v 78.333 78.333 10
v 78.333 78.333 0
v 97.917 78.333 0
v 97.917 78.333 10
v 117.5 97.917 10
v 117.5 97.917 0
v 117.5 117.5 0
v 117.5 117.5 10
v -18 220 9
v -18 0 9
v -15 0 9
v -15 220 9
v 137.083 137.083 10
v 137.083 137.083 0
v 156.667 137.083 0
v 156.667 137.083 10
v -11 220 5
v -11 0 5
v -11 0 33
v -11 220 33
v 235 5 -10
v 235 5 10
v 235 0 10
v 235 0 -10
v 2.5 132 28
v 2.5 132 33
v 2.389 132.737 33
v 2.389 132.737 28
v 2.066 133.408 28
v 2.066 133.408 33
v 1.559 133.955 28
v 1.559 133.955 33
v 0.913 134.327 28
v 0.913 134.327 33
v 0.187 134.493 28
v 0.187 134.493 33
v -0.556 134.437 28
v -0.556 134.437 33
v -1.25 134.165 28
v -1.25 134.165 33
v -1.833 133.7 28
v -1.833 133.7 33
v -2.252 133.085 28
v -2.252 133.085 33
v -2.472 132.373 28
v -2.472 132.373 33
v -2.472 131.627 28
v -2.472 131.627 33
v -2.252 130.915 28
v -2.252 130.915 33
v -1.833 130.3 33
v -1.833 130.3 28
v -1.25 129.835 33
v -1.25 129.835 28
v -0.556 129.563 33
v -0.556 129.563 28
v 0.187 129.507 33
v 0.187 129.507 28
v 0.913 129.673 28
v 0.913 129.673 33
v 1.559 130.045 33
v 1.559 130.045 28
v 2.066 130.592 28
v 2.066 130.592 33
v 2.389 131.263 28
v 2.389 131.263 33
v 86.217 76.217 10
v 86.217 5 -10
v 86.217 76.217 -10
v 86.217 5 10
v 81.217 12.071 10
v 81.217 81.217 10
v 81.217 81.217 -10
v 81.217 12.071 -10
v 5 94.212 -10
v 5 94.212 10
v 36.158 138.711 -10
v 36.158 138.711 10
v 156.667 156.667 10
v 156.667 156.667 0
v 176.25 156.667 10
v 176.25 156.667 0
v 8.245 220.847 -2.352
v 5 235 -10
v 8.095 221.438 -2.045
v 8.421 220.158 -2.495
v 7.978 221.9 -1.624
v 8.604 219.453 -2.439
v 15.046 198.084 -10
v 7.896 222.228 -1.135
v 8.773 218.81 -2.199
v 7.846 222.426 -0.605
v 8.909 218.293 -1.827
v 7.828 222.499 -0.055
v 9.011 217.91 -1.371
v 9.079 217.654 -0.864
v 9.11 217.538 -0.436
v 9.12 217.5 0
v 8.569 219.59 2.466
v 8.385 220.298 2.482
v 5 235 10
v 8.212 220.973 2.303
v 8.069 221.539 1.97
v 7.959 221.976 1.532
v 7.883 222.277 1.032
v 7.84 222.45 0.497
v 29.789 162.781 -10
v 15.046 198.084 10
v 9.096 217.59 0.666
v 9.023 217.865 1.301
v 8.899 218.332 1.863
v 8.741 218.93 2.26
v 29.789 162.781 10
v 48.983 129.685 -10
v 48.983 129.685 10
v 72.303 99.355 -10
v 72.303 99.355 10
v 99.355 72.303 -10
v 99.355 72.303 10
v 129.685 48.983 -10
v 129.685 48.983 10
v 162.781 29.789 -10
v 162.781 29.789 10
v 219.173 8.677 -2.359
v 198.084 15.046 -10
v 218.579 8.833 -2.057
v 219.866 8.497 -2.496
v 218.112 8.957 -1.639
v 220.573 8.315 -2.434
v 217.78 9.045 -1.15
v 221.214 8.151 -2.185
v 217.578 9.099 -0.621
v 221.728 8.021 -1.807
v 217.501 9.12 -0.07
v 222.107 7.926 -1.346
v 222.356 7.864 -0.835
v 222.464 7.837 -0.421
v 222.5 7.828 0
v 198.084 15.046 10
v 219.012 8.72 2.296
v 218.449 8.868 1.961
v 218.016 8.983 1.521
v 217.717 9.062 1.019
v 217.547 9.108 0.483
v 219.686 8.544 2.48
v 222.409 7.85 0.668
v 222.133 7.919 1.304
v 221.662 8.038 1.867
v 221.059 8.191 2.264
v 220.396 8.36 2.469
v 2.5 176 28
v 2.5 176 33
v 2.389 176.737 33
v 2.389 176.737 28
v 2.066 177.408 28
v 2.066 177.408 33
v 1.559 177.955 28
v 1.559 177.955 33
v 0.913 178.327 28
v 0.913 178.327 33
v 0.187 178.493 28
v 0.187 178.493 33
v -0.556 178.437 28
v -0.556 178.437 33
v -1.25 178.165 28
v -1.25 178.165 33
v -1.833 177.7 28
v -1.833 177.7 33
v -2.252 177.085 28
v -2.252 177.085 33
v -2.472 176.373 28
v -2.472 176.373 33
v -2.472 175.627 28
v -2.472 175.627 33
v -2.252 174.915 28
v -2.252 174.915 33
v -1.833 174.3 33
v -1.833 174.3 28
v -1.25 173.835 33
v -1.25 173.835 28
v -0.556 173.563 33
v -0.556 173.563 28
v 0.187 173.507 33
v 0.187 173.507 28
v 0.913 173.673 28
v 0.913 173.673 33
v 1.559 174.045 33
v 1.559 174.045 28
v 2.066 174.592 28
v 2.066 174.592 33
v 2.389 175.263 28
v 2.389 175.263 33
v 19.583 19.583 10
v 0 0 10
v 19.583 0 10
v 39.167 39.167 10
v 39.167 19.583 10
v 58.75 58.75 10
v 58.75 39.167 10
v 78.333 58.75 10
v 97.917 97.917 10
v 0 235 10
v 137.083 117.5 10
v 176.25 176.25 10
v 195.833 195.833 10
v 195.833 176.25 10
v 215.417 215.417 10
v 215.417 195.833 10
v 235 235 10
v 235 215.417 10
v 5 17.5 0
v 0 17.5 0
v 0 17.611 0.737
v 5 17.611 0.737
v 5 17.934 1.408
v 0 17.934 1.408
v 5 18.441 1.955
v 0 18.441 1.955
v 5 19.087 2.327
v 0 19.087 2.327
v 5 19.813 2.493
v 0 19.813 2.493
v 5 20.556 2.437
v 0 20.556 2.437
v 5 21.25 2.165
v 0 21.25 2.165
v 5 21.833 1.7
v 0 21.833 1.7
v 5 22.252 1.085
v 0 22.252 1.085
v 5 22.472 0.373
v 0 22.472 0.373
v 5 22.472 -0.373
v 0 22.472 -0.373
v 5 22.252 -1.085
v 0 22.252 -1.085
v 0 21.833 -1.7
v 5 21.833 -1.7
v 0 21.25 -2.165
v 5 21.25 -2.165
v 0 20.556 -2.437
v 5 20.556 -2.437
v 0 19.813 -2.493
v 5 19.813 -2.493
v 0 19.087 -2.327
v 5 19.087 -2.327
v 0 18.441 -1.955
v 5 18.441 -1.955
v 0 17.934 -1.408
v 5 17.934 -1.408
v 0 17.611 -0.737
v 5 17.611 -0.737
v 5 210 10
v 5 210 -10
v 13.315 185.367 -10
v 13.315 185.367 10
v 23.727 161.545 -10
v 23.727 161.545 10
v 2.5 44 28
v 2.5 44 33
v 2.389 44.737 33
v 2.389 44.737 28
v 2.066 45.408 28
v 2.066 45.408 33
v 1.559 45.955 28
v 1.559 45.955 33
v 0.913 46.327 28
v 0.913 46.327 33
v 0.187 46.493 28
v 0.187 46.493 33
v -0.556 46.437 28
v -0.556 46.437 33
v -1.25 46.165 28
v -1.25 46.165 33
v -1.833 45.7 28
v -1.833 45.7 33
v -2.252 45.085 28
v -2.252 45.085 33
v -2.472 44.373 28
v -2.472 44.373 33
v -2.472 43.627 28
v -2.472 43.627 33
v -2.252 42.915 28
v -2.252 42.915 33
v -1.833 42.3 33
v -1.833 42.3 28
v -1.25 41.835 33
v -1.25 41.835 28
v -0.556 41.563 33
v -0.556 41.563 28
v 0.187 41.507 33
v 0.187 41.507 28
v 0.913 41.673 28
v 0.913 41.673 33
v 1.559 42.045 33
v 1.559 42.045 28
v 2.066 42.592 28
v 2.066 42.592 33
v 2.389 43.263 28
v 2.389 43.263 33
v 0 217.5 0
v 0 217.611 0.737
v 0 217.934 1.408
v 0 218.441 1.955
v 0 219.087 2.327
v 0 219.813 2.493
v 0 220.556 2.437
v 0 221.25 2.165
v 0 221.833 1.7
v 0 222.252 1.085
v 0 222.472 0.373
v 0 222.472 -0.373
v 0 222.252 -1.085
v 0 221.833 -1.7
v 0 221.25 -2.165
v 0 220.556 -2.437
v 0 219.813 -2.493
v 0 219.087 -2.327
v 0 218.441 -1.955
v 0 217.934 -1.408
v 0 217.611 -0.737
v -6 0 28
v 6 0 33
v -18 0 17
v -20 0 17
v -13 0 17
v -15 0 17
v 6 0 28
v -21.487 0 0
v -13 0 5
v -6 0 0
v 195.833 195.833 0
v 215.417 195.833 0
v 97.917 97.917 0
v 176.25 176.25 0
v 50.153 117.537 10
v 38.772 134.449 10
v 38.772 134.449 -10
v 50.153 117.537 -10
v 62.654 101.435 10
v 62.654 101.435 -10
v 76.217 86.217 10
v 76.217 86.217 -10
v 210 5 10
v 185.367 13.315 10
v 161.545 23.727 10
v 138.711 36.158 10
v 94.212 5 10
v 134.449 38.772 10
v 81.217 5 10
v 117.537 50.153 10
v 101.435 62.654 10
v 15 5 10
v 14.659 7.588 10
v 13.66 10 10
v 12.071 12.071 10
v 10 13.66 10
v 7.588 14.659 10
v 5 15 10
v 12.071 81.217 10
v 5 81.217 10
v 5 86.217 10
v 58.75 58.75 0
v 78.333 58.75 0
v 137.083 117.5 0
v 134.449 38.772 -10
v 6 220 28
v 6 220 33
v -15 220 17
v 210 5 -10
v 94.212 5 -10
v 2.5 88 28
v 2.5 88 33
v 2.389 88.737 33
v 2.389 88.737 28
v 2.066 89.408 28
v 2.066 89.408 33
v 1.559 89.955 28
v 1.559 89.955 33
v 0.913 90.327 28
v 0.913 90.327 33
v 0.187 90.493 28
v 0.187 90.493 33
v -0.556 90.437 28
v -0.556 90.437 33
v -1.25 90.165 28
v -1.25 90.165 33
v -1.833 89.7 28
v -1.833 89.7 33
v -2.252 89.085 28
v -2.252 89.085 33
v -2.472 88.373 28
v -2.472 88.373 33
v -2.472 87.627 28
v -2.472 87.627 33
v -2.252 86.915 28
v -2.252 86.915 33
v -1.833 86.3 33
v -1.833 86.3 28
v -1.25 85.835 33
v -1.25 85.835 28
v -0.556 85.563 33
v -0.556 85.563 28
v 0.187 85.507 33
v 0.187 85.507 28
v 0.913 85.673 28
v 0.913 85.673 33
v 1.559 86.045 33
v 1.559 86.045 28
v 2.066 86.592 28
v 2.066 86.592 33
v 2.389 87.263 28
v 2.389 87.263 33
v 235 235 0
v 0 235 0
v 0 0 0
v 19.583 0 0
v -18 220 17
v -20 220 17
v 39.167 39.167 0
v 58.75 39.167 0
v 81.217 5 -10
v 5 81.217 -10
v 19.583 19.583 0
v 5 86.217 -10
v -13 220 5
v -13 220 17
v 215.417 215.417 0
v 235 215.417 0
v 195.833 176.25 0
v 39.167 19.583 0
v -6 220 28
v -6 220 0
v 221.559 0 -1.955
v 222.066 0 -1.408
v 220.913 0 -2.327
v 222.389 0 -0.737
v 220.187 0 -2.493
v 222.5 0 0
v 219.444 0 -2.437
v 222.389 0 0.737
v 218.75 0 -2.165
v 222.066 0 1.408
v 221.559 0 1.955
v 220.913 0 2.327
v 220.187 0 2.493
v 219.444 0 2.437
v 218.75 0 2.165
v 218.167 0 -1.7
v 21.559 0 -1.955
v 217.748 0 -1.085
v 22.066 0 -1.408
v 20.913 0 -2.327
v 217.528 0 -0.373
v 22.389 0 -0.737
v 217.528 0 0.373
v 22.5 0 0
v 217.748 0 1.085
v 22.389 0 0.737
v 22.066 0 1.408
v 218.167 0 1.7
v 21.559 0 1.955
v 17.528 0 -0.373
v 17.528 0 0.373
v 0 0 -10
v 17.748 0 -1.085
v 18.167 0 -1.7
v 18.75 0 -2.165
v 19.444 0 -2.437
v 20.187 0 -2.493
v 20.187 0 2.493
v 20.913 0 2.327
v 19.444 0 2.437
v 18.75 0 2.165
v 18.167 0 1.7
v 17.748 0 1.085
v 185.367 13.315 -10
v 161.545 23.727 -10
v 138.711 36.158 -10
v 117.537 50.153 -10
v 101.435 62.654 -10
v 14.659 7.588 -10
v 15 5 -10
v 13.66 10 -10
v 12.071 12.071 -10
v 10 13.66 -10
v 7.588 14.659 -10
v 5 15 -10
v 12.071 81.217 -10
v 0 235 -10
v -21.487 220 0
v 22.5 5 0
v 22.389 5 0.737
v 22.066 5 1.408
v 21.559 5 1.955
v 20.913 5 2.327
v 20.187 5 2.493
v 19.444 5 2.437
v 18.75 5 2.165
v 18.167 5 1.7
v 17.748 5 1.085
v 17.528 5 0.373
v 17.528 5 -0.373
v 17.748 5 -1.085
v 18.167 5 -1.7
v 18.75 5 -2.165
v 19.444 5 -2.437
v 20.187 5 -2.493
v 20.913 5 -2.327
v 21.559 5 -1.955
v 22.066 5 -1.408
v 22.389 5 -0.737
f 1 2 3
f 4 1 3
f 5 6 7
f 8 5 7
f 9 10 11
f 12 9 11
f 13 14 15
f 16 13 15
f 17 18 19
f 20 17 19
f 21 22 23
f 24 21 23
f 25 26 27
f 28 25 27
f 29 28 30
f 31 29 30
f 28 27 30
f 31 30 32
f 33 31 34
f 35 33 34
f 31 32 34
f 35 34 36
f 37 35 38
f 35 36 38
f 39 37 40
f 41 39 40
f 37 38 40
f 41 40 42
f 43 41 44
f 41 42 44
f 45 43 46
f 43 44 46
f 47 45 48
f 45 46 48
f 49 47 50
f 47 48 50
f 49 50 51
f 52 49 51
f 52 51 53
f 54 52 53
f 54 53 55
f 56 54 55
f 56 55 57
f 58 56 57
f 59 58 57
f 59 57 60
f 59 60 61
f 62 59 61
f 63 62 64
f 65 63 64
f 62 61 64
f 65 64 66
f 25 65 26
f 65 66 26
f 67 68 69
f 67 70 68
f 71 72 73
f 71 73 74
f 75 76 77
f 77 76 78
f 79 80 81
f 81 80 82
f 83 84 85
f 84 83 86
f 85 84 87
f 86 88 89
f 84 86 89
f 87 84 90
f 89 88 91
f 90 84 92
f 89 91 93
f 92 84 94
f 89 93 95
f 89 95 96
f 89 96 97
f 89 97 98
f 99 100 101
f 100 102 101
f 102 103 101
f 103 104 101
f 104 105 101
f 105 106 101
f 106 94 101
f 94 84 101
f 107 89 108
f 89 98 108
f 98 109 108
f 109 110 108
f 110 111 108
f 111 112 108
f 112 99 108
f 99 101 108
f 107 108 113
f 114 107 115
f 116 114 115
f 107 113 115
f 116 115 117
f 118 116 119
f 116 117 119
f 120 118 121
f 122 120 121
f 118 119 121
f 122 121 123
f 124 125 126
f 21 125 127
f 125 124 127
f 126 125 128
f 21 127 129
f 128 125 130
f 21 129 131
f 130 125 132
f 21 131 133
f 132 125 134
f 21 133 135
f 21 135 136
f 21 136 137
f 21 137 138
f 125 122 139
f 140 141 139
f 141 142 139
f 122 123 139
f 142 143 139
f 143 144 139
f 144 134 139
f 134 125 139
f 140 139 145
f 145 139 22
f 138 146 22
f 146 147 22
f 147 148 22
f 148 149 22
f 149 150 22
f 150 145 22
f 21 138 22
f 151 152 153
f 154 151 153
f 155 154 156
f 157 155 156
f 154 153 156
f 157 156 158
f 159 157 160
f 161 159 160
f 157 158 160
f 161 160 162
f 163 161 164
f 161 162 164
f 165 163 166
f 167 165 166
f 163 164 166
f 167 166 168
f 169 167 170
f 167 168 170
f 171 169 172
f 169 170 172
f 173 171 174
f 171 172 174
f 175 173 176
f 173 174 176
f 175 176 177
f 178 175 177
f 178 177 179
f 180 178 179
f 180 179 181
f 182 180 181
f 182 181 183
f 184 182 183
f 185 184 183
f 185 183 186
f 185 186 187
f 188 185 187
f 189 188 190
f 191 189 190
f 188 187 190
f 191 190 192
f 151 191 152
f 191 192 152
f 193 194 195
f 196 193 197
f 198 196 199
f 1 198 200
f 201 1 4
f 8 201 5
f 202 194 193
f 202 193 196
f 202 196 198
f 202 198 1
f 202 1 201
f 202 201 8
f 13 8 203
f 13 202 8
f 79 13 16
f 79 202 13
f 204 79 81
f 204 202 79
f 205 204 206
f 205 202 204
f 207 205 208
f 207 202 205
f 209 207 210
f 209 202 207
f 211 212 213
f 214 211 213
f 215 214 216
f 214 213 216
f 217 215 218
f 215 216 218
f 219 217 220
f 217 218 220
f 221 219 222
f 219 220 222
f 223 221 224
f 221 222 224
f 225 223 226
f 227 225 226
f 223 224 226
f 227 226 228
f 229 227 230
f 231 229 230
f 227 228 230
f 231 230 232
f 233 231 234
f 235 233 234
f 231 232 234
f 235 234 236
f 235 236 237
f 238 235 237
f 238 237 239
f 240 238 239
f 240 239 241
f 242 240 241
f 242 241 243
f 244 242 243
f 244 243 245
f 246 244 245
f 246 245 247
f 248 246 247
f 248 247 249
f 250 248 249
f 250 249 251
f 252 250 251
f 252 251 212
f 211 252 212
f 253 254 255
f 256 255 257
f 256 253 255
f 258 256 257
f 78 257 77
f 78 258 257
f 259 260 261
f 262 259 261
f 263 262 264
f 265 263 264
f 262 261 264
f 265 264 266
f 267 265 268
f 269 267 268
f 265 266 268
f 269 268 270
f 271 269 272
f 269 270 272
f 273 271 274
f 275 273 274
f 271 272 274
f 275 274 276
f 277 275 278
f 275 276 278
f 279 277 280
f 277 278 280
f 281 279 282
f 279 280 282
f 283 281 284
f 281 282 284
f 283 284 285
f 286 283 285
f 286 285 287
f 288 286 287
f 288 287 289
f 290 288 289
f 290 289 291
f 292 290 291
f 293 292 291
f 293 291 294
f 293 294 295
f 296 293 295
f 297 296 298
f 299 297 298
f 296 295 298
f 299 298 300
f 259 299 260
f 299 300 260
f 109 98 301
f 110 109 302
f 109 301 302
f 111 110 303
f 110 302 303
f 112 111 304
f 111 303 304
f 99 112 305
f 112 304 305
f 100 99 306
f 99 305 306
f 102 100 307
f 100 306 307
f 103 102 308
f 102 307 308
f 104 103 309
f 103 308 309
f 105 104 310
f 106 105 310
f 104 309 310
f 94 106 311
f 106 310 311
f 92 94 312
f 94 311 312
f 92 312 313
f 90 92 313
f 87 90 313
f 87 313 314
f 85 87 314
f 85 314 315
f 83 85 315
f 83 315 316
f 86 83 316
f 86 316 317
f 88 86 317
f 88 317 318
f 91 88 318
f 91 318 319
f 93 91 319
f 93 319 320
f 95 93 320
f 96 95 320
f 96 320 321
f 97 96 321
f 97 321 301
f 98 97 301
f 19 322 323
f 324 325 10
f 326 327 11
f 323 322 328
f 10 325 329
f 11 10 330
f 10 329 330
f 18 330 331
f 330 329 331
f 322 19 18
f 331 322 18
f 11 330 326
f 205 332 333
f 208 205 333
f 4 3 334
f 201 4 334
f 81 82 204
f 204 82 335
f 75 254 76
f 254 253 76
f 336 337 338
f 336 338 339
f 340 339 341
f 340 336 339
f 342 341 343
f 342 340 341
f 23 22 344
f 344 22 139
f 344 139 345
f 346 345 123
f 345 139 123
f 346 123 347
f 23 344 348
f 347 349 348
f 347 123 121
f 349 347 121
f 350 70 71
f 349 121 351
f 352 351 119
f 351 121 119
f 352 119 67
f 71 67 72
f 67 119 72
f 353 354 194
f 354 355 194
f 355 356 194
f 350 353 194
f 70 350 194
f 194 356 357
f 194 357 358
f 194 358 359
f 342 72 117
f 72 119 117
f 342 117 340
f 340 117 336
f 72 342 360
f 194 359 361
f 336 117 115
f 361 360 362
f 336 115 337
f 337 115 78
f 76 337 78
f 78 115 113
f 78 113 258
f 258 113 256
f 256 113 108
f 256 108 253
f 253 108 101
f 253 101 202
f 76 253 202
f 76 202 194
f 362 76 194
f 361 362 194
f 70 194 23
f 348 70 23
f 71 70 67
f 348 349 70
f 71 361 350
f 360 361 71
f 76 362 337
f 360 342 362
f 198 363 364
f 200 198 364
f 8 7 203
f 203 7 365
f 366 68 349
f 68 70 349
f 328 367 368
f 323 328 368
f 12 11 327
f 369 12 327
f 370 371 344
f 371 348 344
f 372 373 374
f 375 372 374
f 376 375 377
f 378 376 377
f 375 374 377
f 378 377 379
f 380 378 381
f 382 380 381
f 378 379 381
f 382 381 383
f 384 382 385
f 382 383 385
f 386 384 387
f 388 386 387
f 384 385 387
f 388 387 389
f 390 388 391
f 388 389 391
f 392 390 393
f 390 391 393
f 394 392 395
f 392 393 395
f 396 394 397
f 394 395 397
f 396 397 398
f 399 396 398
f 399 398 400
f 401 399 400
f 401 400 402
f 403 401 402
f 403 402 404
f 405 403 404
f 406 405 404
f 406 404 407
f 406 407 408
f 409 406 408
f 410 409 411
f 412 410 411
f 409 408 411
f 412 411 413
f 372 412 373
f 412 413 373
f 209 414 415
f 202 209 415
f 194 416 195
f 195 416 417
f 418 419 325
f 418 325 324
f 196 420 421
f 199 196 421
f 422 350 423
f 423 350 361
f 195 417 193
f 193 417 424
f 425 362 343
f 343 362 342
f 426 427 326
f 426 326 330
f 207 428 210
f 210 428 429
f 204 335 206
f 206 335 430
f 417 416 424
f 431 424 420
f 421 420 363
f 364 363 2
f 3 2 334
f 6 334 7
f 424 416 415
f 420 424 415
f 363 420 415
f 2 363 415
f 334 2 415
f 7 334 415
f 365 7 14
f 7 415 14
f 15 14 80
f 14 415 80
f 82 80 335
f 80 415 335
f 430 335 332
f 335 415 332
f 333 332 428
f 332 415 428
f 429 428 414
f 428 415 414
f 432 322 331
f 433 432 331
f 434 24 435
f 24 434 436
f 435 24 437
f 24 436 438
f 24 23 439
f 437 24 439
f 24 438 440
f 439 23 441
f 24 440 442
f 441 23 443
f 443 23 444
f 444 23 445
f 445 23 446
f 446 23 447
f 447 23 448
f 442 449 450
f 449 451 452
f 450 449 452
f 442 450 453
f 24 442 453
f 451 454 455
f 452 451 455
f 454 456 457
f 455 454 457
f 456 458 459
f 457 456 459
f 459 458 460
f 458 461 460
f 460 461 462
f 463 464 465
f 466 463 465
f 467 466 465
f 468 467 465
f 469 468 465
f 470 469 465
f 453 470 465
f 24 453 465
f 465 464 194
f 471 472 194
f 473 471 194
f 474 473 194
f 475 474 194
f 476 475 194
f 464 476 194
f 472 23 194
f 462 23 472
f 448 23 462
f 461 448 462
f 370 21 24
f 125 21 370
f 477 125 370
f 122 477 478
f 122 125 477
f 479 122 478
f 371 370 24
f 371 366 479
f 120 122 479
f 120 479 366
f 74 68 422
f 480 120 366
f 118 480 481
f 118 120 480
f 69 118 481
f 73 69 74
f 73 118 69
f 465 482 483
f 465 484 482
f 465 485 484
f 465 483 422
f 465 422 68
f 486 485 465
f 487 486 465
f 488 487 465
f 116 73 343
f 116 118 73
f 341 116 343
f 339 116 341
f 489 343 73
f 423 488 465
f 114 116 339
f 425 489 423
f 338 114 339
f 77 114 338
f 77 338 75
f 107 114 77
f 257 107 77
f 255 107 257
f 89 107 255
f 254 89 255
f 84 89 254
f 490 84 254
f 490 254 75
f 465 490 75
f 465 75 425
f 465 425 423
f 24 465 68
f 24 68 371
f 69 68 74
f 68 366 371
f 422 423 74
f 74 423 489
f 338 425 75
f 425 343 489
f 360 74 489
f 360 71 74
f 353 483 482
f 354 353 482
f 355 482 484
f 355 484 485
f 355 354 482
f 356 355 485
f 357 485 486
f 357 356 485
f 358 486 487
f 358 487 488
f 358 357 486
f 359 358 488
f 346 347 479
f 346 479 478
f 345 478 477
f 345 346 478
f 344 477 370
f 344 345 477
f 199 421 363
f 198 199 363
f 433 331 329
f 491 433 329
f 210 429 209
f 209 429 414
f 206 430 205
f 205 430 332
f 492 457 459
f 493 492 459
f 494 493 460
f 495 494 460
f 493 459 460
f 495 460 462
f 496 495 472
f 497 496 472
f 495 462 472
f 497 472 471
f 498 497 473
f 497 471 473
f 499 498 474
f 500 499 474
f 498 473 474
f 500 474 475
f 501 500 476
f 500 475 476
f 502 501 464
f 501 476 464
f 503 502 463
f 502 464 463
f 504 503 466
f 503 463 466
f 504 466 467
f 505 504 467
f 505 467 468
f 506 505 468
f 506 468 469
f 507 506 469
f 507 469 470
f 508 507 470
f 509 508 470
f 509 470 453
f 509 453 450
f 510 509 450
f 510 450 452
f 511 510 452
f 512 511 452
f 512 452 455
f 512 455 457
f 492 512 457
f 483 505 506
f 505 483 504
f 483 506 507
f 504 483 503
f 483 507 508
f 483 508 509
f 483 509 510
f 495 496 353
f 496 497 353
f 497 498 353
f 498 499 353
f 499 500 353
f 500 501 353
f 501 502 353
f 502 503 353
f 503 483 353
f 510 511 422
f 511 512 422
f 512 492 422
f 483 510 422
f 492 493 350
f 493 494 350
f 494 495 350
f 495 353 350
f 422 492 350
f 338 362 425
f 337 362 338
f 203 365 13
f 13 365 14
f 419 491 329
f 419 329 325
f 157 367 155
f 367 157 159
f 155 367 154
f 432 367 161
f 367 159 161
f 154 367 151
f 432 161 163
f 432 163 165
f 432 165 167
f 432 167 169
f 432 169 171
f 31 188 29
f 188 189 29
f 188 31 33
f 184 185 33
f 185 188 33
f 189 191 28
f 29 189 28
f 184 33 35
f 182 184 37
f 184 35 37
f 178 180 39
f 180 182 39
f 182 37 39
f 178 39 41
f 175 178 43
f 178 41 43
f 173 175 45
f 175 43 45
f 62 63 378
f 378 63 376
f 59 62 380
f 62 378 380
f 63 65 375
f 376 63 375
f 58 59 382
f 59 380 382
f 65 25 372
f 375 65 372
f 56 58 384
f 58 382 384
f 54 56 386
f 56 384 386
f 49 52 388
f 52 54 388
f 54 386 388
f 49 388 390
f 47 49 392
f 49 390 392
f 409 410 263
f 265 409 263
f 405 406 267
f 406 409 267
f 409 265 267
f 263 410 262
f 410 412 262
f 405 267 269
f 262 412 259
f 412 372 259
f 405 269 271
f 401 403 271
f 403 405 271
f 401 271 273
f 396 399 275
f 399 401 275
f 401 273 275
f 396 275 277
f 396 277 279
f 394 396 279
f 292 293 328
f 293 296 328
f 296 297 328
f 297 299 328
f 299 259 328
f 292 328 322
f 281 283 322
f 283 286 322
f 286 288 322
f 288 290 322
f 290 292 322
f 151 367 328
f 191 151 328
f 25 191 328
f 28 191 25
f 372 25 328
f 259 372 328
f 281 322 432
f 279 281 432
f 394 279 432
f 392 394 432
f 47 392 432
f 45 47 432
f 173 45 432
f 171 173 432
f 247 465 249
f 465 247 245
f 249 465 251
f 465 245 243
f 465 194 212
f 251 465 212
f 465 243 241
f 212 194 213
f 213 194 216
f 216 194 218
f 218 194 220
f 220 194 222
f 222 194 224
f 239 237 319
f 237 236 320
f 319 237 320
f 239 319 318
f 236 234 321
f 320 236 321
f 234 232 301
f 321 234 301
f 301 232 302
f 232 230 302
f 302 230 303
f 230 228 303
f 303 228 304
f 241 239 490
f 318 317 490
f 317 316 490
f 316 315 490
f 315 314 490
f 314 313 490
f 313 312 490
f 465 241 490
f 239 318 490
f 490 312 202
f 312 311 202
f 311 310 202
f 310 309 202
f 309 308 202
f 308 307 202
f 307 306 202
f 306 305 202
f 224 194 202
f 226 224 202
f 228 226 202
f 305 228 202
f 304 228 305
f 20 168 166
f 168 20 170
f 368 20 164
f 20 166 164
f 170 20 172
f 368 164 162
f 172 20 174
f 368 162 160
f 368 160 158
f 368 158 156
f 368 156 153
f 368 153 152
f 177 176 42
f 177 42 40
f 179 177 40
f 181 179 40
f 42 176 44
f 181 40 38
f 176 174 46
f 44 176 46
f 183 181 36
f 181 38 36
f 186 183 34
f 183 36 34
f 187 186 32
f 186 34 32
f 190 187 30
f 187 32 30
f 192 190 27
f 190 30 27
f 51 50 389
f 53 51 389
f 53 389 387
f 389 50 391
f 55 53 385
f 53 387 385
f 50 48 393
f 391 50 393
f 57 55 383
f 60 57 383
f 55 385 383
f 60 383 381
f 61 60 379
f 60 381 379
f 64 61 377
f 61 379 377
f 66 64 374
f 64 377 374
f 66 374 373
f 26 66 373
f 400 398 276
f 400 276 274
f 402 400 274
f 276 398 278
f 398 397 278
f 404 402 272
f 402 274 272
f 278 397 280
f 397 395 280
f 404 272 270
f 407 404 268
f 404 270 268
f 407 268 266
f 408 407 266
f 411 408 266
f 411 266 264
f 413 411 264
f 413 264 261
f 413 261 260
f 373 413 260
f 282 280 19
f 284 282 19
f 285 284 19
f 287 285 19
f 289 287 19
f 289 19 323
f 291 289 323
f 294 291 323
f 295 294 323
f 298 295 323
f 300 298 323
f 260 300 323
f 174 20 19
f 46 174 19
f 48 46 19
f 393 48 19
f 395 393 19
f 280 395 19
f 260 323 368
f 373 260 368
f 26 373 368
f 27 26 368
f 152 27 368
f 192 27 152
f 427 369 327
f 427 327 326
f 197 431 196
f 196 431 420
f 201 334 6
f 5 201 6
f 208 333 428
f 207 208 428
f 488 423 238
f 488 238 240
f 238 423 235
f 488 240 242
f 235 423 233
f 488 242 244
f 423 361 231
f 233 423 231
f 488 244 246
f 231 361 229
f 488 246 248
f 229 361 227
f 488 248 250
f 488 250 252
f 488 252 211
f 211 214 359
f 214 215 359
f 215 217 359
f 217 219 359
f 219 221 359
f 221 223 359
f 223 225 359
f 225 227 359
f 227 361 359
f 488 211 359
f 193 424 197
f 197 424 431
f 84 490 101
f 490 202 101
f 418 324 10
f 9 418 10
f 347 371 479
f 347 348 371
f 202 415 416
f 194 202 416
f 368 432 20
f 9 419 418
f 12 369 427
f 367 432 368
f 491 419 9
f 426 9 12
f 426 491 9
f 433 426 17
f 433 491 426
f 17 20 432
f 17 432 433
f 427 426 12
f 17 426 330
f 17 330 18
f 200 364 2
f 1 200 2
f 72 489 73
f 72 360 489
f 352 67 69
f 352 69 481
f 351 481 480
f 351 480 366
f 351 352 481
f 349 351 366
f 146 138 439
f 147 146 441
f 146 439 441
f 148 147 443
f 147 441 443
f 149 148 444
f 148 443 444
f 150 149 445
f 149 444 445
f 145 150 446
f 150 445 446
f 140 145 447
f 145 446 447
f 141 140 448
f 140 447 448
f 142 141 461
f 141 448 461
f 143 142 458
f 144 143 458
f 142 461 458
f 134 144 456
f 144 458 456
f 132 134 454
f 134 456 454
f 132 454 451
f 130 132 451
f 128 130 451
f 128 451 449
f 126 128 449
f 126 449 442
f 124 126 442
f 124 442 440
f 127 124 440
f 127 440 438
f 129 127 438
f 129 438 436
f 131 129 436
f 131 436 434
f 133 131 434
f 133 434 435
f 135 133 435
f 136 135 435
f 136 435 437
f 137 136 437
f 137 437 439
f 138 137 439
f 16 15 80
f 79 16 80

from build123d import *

# Parameters (mm, degrees)
PAD_DEPTH            = 10
POCKET_DEPTH         = 3
PAD001_DEPTH         = 10
PAD001_DEPTH_BACK    = 10
SKETCH003_R          = 2.5
POCKET001_DEPTH      = 50
SKETCH004_R          = 3.175
PAD002_DEPTH         = 5
FILLET_R             = 3.175
SKETCH009_R          = 2.5
POCKET004_DEPTH      = 20
SKETCH010_W          = 169.420898
SKETCH010_H          = 244.634888
POCKET005_DEPTH      = 100
POCKET005_DEPTH_BACK = -100
PAD003_DEPTH         = 220
SKETCH007_R          = 2.5
POCKET002_DEPTH      = 5
SKETCH008_W          = 33.656536
SKETCH008_H          = 69.505769
POCKET003_DEPTH      = 1000
POCKET003_DEPTH_BACK = -10000


with BuildPart() as tetris:
    # Sketch → Pad (new body)
    with BuildSketch(Plane.XY):
        Polygon((0, 0), (19.583333, 0), (19.583333, 19.583333), (39.166667, 19.583333), (39.166667, 39.166667), (58.75, 39.166667), (58.75, 58.75), (78.333333, 58.75), (78.333333, 78.333333), (97.916667, 78.333333), (97.916667, 97.916667), (117.5, 97.916667), (117.5, 117.5), (137.083333, 117.5), (137.083333, 137.083333), (156.666667, 137.083333), (156.666667, 156.666667), (176.25, 156.666667), (176.25, 176.25), (195.833333, 176.25), (195.833333, 195.833333), (215.416667, 195.833333), (215.416667, 215.416667), (235, 215.416667), (235, 235), (0, 235), align=None)
    extrude(amount=PAD_DEPTH)

    # Sketch001 (on Face28 of Pad) → Pocket (cut)
    with BuildSketch(Plane.XY.offset(10)):
        Polygon((74.866753, 25.089148), (93.950086, 25.089148), (94.200086, 24.839148), (93.950086, 24.589148), (74.866753, 24.589148), (74.616753, 24.839148), align=None)
    extrude(amount=-POCKET_DEPTH, mode=Mode.SUBTRACT)


with BuildPart() as simple:
    # Sketch002 → Pad001 (new body, two sides)
    with BuildSketch(Plane.XY) as pad001_sk:
        with BuildLine():
            Line((0, 0), (0, 235))
            Line((0, 235), (5, 235))
            ThreePointArc((5, 235), (85.389585, 85.389585), (235, 5))
            Line((235, 5), (235, 0))
            Line((235, 0), (0, 0))
        make_face()
        with BuildLine():
            Line((5, 210), (5, 94.212312))
            Line((5, 94.212312), (36.158256, 138.710913))
            ThreePointArc((5, 210), (18.263415, 173.34333), (36.158256, 138.710913))
        make_face(mode=Mode.SUBTRACT)
        with BuildLine():
            Line((15, 5), (81.216914, 5))
            Line((81.216914, 5), (5, 81.216914))
            Line((5, 81.216914), (5, 15))
            ThreePointArc((15, 5), (12.071068, 12.071068), (5, 15))
        make_face(mode=Mode.SUBTRACT)
        with BuildLine():
            Line((5, 86.216914), (76.216914, 86.216914))
            ThreePointArc((38.772184, 134.448592), (56.266923, 109.379684), (76.216914, 86.216914))
            Line((5, 86.216914), (38.772184, 134.448592))
        make_face(mode=Mode.SUBTRACT)
        with BuildLine():
            Line((86.216914, 5), (86.216914, 76.216914))
            ThreePointArc((86.216914, 76.216914), (109.379684, 56.266923), (134.448592, 38.772184))
            Line((86.216914, 5), (134.448592, 38.772184))
        make_face(mode=Mode.SUBTRACT)
        Polygon((12.071068, 81.216914), (81.216914, 81.216914), (81.216914, 12.071068), align=None, mode=Mode.SUBTRACT)
        with BuildLine():
            Line((94.212312, 5), (210, 5))
            ThreePointArc((138.710913, 36.158256), (173.34333, 18.263415), (210, 5))
            Line((94.212312, 5), (138.710913, 36.158256))
        make_face(mode=Mode.SUBTRACT)
    extrude(amount=PAD001_DEPTH)
    extrude(pad001_sk.sketch, amount=-PAD001_DEPTH_BACK)

    # Sketch003 (on Face5 of Pad001) → Pocket001 (cut)
    with BuildSketch(Plane.XZ):
        with Locations((20, 0)):
            Circle(SKETCH003_R)
        with Locations((220, 0)):
            Circle(SKETCH003_R)
    extrude(amount=-POCKET001_DEPTH, mode=Mode.SUBTRACT)

    # Sketch004 (on Face1 of Pocket001) → Pad002 (join)
    with BuildSketch(Plane(origin=(0, 0, 0), x_dir=(0, -1, 0), z_dir=(-1, 0, 0))):
        with Locations((-220, 0)):
            Circle(SKETCH004_R)
    extrude(amount=PAD002_DEPTH)

    # Fillet
    fillet_edges = [simple.edges().sort_by_distance(p)[0] for p in [
        (-5, 223.175, 0),
    ]]
    fillet(fillet_edges, radius=FILLET_R)

    # Sketch009 (on Face3 of Fillet) → Pocket004 (cut)
    with BuildSketch(Plane(origin=(0, 0, 0), x_dir=(0, -1, 0), z_dir=(-1, 0, 0))):
        with Locations((-20, 0)):
            Circle(SKETCH009_R)
        with Locations((-220, 0)):
            Circle(SKETCH009_R)
    extrude(amount=-POCKET004_DEPTH, mode=Mode.SUBTRACT)

    # Sketch010 → Pocket005 (cut, two sides)
    with BuildSketch(Plane.XY) as pocket005_sk:
        with Locations((-84.710449, 122.317444)):
            Rectangle(SKETCH010_W, SKETCH010_H)
    extrude(amount=-POCKET005_DEPTH, mode=Mode.SUBTRACT)
    extrude(pocket005_sk.sketch, amount=-POCKET005_DEPTH_BACK, mode=Mode.SUBTRACT)


with BuildPart() as bin_hangar:
    # Pad003_Profile → Pad003 (new body)
    with BuildSketch(Plane(origin=(0, 0, 14.181195), x_dir=(1, 0, 0), z_dir=(0, 1, 0))):
        Polygon((-11, 9.181195), (-11, -18.818805), (11, -18.818805), (11, 9.181195), (13, 9.181195), (13, -2.818805), (15, -2.818805), (15, 5.181195), (18, 5.181195), (18, -2.818805), (20, -2.818805), (21.487307, 14.181195), (6, 14.181195), (6, -13.818805), (-6, -13.818805), (-6, 14.181195), (-21.487307, 14.181195), (-20, -2.818805), (-18, -2.818805), (-18, 5.181195), (-15, 5.181195), (-15, -2.818805), (-13, -2.818805), (-13, 9.181195), align=None)
    extrude(amount=PAD003_DEPTH)

    # Sketch007 (on Face24 of Pad003) → Pocket002 (cut)
    with BuildSketch(Plane.XY.offset(33)):
        with Locations((0, 44)):
            Circle(SKETCH007_R)
        with Locations((0, 88)):
            Circle(SKETCH007_R)
        with Locations((0, 132)):
            Circle(SKETCH007_R)
        with Locations((0, 176)):
            Circle(SKETCH007_R)
    extrude(amount=-POCKET002_DEPTH, mode=Mode.SUBTRACT)

    # Sketch008 → Pocket003 (cut, two sides)
    with BuildSketch(Plane.XZ) as pocket003_sk:
        with Locations((22.828268, 23.419987)):
            Rectangle(SKETCH008_W, SKETCH008_H)
    extrude(amount=-POCKET003_DEPTH, mode=Mode.SUBTRACT)
    extrude(pocket003_sk.sketch, amount=-POCKET003_DEPTH_BACK, mode=Mode.SUBTRACT)


solid = Compound([tetris.part, simple.part, bin_hangar.part])
